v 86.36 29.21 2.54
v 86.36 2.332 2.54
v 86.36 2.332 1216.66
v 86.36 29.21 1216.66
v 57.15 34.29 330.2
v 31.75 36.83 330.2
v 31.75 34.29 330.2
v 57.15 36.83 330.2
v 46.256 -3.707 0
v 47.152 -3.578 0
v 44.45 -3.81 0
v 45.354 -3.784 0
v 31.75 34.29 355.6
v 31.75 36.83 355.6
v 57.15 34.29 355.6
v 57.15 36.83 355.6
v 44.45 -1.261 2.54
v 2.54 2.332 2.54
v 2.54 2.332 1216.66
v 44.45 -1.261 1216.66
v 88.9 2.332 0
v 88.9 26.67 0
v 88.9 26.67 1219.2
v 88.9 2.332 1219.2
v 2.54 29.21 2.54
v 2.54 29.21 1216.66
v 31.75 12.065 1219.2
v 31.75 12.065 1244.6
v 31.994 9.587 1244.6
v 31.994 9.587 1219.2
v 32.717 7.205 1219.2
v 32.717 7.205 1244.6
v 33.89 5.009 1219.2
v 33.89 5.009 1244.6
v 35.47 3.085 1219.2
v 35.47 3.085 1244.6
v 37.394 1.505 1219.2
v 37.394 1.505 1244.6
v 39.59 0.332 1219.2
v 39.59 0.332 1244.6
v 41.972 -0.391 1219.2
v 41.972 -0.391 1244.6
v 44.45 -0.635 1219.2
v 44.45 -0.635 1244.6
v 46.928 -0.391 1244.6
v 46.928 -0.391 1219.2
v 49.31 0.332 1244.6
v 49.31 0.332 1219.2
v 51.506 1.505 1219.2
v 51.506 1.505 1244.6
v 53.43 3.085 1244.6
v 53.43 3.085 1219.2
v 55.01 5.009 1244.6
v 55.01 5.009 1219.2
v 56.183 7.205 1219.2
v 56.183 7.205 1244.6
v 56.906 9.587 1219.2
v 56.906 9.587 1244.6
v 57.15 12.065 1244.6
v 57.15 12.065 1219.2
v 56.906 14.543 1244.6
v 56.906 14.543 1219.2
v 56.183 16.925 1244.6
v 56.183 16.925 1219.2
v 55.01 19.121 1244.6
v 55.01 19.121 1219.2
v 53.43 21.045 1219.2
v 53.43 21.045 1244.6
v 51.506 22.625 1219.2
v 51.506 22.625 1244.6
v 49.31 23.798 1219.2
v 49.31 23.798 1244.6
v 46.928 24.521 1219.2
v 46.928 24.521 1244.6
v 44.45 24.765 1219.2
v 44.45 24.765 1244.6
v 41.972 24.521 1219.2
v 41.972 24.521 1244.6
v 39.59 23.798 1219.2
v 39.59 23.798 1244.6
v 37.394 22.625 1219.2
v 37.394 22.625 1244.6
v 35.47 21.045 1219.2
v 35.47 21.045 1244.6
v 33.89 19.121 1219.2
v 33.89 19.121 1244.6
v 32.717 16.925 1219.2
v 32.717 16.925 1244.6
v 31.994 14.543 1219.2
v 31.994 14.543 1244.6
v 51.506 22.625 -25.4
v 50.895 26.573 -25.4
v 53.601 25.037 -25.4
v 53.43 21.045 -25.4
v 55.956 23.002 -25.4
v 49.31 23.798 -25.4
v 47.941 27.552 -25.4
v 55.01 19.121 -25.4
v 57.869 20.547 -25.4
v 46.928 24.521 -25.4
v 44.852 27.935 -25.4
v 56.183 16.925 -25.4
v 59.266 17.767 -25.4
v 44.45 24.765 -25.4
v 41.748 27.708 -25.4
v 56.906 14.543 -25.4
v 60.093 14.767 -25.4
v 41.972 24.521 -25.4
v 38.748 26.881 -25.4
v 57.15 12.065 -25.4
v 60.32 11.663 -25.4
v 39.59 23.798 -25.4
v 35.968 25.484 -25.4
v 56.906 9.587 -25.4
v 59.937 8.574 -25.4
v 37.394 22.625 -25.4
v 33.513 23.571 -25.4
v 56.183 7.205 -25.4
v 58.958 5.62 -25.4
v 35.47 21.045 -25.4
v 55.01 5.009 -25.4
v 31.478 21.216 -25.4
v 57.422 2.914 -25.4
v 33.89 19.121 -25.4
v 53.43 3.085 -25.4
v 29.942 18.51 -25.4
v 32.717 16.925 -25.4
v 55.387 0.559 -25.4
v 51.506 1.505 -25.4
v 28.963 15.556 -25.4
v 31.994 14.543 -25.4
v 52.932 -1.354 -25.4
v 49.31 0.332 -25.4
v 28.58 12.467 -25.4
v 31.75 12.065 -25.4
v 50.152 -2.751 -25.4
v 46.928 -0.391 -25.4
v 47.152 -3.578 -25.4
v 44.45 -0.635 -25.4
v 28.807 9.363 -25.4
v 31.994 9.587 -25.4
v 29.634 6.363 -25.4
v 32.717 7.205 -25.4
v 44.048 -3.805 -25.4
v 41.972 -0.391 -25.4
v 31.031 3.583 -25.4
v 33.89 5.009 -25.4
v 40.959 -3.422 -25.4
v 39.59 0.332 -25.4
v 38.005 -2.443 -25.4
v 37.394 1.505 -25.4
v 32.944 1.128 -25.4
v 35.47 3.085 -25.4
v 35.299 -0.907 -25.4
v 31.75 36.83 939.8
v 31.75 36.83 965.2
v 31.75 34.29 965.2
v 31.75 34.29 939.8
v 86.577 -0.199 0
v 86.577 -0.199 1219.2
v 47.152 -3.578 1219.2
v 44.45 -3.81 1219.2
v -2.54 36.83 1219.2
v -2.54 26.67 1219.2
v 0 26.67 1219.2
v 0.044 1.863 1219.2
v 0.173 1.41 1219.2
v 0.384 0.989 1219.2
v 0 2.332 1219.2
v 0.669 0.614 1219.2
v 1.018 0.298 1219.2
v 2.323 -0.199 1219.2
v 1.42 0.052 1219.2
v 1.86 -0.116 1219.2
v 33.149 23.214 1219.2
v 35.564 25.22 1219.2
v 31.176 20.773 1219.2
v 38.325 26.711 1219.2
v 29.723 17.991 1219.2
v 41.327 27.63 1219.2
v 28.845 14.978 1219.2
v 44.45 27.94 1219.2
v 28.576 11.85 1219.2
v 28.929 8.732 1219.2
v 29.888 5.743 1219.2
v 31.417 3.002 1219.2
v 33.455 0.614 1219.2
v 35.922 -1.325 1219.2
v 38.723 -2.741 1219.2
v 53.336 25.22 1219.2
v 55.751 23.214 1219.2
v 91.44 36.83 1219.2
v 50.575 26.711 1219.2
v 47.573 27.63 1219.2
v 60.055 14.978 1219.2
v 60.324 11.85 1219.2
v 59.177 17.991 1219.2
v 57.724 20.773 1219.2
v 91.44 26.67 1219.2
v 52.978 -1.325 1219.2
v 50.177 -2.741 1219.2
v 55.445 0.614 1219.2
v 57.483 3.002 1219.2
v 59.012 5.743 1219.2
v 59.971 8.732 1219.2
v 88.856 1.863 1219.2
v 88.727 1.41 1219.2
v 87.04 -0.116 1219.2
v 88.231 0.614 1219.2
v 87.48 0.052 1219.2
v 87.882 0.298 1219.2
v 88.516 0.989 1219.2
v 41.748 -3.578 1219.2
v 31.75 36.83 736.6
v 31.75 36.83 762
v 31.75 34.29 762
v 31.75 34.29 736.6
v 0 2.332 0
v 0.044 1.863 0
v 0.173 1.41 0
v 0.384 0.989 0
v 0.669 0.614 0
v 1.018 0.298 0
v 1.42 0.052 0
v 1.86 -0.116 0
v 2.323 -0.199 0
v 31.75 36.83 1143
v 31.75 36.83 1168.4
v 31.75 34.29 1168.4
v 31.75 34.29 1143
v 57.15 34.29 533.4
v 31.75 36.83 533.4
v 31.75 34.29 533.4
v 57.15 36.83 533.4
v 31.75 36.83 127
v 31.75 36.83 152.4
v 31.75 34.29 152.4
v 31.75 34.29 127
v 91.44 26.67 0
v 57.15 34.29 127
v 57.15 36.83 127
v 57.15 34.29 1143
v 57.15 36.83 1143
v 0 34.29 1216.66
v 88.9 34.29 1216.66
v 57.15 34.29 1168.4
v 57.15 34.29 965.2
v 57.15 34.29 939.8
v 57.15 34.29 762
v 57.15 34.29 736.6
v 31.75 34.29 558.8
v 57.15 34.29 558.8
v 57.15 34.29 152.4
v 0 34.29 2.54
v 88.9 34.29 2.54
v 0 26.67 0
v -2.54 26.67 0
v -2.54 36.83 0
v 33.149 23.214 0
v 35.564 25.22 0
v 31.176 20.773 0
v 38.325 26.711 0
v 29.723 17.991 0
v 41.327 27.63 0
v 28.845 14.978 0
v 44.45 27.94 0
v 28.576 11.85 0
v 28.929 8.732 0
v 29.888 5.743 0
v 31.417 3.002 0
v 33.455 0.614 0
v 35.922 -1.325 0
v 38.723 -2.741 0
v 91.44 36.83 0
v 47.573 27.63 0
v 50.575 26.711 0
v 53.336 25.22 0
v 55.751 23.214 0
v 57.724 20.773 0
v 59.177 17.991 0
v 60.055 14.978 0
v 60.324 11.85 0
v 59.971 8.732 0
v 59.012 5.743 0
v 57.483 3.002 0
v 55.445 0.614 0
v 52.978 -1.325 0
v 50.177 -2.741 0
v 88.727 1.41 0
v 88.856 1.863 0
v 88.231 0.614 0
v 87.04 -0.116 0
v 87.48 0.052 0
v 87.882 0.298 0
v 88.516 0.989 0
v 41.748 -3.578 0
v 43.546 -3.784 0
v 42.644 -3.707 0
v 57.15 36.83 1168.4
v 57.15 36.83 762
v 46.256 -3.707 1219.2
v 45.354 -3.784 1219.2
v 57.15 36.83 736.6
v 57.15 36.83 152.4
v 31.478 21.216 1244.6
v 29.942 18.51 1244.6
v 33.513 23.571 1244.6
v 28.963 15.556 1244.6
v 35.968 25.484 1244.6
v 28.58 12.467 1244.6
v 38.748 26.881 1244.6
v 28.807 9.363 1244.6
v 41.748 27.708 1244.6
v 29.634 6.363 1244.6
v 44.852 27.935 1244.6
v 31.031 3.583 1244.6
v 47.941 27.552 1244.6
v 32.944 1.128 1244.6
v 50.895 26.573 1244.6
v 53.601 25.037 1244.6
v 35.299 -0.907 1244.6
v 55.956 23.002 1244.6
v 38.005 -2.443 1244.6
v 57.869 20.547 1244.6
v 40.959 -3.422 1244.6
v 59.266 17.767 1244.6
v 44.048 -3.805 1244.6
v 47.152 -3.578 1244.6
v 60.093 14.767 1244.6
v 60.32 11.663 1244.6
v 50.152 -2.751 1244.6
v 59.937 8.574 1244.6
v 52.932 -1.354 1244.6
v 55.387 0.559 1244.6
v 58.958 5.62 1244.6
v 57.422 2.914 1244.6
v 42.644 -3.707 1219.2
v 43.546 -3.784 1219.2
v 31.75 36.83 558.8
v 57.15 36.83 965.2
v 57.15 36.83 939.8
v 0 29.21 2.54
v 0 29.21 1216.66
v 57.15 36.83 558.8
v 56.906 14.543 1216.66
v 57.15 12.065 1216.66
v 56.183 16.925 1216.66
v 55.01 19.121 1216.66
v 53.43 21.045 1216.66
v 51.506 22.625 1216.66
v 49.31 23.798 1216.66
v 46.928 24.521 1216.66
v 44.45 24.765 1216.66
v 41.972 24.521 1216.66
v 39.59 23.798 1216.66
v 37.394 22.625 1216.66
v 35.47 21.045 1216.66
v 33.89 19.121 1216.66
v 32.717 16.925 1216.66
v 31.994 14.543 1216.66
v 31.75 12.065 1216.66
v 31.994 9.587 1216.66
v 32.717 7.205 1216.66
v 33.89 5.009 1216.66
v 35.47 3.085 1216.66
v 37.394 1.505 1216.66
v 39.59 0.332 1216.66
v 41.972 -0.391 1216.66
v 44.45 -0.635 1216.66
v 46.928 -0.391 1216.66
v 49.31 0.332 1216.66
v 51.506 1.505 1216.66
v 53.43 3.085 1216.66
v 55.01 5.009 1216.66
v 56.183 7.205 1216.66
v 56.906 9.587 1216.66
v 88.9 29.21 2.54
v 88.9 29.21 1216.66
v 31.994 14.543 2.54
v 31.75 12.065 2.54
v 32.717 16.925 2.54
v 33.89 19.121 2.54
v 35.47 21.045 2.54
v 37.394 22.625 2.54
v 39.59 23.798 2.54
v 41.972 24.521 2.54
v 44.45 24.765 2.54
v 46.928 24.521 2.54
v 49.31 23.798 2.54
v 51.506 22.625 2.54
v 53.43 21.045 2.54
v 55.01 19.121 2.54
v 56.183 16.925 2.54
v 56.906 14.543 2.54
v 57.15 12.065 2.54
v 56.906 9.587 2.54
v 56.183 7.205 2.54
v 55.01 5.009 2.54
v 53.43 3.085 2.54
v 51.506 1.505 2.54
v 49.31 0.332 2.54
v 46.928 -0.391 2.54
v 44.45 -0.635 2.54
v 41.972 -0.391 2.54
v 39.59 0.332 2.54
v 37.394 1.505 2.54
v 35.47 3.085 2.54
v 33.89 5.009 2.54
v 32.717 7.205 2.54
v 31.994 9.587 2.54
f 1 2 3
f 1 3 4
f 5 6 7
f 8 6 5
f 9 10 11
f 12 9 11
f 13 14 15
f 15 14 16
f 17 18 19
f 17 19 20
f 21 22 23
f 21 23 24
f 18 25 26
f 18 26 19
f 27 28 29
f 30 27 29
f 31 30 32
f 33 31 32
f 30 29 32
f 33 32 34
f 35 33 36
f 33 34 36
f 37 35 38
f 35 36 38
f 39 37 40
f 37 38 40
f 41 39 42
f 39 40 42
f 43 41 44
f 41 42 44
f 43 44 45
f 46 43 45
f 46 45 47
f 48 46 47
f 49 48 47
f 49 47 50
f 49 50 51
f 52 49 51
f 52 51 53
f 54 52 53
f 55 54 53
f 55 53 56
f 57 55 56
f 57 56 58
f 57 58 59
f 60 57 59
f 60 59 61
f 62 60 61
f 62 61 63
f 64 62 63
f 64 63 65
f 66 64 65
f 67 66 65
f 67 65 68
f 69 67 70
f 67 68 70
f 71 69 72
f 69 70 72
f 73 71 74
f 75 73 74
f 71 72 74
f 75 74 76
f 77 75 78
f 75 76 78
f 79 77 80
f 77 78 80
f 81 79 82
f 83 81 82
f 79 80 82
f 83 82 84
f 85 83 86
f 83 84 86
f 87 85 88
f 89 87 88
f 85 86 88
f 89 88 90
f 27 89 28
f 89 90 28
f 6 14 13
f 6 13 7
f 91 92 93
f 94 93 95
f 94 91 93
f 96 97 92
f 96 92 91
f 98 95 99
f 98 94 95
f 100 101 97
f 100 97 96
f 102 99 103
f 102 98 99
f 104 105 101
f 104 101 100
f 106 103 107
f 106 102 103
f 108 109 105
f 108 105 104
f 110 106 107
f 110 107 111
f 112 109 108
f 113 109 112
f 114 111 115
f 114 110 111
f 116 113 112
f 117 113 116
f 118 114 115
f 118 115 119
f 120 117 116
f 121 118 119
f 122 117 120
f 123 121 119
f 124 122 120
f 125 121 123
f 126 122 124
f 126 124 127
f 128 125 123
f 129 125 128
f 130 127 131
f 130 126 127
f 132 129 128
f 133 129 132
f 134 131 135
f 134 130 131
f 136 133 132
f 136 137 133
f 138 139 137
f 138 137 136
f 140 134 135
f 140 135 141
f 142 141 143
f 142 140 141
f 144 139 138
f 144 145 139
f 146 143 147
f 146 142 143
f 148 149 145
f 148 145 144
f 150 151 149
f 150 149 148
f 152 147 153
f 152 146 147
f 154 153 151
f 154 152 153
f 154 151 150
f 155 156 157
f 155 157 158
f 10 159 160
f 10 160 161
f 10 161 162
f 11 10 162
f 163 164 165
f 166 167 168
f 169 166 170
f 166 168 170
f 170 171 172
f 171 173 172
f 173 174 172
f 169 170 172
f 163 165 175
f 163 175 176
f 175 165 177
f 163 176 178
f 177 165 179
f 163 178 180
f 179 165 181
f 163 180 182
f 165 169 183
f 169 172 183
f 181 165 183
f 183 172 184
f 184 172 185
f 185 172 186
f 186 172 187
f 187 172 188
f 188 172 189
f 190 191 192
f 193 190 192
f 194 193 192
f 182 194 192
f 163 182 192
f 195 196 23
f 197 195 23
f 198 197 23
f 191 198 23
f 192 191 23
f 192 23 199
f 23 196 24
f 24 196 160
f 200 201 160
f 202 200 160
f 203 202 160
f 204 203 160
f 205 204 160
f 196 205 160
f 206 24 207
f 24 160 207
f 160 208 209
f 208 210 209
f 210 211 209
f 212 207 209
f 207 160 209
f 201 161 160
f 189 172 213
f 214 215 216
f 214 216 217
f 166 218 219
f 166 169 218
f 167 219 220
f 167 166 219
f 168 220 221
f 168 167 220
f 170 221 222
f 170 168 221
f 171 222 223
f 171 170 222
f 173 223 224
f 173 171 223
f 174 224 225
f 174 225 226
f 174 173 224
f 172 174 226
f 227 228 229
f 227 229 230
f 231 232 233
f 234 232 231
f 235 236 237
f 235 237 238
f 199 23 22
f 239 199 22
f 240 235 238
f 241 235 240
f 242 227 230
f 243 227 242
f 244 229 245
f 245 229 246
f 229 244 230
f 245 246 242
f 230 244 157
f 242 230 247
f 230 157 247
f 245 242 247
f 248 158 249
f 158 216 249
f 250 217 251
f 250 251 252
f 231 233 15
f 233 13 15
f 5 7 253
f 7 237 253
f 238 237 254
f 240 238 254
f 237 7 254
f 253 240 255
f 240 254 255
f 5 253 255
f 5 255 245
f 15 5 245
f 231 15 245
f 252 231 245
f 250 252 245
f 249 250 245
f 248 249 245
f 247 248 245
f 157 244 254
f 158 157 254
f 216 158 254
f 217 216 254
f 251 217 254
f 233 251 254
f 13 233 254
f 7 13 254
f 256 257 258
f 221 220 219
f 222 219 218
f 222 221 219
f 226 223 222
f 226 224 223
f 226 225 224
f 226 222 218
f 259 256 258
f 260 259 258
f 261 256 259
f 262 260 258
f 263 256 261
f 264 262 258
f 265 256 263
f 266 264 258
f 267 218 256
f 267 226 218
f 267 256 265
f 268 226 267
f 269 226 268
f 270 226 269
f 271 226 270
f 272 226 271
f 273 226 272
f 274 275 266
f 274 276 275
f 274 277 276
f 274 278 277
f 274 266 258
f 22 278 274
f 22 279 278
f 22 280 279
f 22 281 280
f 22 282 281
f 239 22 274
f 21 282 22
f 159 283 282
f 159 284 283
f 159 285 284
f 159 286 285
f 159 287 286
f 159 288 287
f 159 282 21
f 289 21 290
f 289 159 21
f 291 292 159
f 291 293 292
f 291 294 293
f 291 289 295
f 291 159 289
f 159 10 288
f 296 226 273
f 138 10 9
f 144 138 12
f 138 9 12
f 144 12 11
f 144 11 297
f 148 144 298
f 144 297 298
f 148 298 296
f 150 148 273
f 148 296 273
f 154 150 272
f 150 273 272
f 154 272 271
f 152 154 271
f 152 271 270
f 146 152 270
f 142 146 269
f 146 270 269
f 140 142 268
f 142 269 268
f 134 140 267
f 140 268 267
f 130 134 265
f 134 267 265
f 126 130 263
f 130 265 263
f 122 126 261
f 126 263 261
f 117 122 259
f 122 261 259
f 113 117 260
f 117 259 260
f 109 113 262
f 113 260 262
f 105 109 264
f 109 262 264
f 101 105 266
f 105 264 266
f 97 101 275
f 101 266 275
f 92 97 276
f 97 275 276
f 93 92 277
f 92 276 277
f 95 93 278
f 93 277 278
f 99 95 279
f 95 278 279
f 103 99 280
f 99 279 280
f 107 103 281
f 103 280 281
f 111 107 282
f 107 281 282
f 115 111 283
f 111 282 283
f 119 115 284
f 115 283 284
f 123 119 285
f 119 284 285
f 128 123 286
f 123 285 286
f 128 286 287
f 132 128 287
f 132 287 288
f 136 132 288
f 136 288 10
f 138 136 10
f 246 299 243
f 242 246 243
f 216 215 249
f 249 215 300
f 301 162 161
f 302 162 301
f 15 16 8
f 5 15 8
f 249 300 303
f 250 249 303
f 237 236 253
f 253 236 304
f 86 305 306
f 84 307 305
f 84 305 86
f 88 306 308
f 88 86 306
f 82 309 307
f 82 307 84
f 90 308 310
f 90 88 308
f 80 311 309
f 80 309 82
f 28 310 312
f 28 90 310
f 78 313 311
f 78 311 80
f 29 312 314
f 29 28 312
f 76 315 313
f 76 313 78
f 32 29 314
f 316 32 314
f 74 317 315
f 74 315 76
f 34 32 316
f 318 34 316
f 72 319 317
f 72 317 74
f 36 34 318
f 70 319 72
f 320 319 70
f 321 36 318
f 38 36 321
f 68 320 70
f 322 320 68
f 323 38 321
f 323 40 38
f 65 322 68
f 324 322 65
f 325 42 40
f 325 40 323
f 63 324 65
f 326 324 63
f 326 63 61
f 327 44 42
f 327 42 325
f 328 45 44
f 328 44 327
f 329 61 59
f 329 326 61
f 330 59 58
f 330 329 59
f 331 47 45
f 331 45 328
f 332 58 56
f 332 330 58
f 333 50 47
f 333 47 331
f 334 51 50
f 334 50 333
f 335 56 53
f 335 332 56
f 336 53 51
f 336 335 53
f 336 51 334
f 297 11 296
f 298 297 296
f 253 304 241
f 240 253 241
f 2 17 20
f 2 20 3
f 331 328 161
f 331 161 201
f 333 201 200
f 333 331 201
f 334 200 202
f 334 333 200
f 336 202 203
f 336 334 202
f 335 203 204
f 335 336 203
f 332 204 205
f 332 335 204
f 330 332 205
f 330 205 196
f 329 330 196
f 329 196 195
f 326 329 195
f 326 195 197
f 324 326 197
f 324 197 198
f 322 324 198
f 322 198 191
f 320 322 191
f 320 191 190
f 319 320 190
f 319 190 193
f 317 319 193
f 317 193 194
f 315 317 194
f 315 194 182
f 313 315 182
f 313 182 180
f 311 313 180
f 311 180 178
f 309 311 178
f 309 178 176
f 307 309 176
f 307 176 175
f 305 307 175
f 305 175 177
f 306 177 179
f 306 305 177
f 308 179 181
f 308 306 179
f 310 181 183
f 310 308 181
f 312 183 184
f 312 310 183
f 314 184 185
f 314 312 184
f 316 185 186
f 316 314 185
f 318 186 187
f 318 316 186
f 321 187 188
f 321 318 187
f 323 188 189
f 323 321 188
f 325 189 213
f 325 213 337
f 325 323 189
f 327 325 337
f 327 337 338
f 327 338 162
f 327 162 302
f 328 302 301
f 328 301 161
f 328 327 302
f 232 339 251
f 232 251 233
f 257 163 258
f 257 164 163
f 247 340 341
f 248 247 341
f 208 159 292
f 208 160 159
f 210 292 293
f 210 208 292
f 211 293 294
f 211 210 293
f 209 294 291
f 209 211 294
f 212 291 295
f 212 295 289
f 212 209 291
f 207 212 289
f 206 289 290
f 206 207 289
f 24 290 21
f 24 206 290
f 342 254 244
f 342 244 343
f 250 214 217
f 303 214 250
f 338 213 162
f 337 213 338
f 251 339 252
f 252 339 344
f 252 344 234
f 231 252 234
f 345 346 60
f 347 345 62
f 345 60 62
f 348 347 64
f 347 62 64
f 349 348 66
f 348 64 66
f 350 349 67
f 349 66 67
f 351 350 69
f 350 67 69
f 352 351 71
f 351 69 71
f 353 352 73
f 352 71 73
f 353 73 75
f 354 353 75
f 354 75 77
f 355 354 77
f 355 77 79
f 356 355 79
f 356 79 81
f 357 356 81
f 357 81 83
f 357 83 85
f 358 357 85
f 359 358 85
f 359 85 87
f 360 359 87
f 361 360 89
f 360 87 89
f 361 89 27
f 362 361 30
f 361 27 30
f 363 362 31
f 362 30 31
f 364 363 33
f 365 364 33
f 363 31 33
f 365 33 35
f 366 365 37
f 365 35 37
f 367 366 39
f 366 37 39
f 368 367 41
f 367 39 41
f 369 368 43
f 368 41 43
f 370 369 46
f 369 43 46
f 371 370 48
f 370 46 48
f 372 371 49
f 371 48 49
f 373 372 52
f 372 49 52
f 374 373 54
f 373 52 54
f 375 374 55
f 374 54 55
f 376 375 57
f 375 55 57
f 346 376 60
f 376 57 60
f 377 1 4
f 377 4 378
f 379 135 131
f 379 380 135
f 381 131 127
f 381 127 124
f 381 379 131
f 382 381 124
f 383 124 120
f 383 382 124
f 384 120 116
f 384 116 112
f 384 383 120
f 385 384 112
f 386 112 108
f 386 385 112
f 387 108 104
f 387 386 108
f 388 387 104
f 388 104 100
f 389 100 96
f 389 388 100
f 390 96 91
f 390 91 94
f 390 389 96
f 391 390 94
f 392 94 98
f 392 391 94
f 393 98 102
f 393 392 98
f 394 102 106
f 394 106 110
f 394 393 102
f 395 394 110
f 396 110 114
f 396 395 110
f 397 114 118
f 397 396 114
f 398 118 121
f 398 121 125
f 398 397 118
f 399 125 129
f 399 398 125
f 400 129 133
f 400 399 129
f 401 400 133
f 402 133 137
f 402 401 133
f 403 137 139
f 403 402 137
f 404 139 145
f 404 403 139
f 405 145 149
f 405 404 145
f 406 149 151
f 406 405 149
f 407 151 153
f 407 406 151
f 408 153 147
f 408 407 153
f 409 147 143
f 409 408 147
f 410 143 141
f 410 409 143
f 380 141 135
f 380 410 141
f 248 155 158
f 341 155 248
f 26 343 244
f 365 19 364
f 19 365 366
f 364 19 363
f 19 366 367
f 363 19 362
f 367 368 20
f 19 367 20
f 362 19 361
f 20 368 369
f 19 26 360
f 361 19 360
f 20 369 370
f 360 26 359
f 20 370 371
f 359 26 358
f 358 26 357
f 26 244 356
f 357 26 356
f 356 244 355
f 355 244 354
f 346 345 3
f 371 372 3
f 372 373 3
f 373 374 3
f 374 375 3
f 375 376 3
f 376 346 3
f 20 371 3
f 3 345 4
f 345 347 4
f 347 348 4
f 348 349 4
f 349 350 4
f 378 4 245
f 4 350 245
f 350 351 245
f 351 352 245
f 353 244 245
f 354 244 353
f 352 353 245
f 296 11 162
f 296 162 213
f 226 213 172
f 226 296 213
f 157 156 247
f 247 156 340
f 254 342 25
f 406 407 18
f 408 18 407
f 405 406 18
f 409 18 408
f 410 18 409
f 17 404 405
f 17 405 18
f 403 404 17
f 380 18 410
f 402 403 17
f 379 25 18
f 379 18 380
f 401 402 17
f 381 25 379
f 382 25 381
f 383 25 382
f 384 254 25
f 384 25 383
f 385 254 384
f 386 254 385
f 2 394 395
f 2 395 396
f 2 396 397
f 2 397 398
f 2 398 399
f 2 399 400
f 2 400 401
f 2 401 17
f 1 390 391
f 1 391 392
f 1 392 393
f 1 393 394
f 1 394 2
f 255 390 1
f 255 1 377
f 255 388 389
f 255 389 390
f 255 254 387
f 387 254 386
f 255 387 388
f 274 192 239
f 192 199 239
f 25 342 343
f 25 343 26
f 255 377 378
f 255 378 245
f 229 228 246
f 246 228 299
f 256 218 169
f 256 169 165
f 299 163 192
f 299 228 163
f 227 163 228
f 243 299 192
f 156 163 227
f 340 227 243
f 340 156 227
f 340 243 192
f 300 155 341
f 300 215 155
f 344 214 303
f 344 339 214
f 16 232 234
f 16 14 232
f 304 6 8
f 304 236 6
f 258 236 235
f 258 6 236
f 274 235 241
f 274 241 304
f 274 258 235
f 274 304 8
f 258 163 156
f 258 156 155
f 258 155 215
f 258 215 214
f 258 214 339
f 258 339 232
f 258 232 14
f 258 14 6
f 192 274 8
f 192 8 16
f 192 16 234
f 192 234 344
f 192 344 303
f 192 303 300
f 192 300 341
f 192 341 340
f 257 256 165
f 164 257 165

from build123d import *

# Parameters (mm, degrees)
BOSS_EXTRUDE1_DEPTH    = 1219.2
SKETCH2_W              = 1219.2
SKETCH2_H              = 7.62
BOSS_EXTRUDE2_DEPTH    = 2.54
SKETCH3_W              = 1219.2
SKETCH3_H              = 7.62
BOSS_EXTRUDE3_DEPTH    = 2.54
SKETCH4_R              = 15.875
SKETCH4_R_2            = 12.7
BOSS_EXTRUDE4_DEPTH    = 25.4
BOSS_EXTRUDE5_START    = 25.4
SKETCH6_R              = 15.875
SKETCH6_R_2            = 12.7
BOSS_EXTRUDE5_DEPTH    = 25.4
SHELL2_START           = 2.54
SHELL2_DEPTH           = 1214.12
SKETCH9_W              = 93.98
SKETCH9_H              = 1219.2
BOSS_EXTRUDE7_DEPTH    = 2.54
FILLET1_R              = 2.54
CUT_EXTRUDE3_START     = -2.54
CUT_EXTRUDE3_OUTLINE_R = 12.7
CUT_EXTRUDE3_DEPTH     = 2.54
SKETCH11_R             = 12.7
CUT_EXTRUDE4_DEPTH     = 2.54
CUT_EXTRUDE5_REACH     = 1250.616
SKETCH12_W             = 25.4
SKETCH12_H             = 25.4
LPATTERN1_COUNT        = 6
LPATTERN1_PITCH        = 203.2


# Read off the part's stored shape, not the designer's step: Shell2, Cut-Extrude3
with BuildPart() as part:
    # Sketch1 → Boss-Extrude1 (new body)
    with BuildSketch(Plane.XY):
        Polygon((0, 0), (0, 34.29), (88.9, 34.29), (88.9, 0), (44.45, -3.81), align=None)
    extrude(amount=BOSS_EXTRUDE1_DEPTH)

    # Sketch2 → Boss-Extrude2 (add)
    with BuildSketch(Plane(origin=(88.9, 0, 0), x_dir=(0, 0, -1), z_dir=(1, 0, 0))):
        with Locations((-609.6, 30.48)):
            Rectangle(SKETCH2_W, SKETCH2_H)
    extrude(amount=BOSS_EXTRUDE2_DEPTH)

    # Sketch3 → Boss-Extrude3 (add)
    with BuildSketch(Plane.ZY):
        with Locations((609.6, 30.48)):
            Rectangle(SKETCH3_W, SKETCH3_H)
    extrude(amount=BOSS_EXTRUDE3_DEPTH)

    # Sketch4 → Boss-Extrude4 (add)
    with BuildSketch(Plane(origin=(0, 0, 0), x_dir=(-1, 0, 0), z_dir=(0, 0, -1))):
        with Locations(Location((-44.45, 12.065, 0), (0, 0, 260.201815092))):
            Circle(SKETCH4_R)
        with Locations((-44.45, 12.065)):
            Circle(SKETCH4_R_2, mode=Mode.SUBTRACT)
    extrude(amount=BOSS_EXTRUDE4_DEPTH)

    # Sketch6 → Boss-Extrude5 (add)
    with BuildSketch(Plane.XY.offset(1219.2).offset(BOSS_EXTRUDE5_START)):
        with Locations(Location((44.45, 12.065, 0), (0, 0, 279.798184908))):
            Circle(SKETCH6_R)
        with Locations(Location((44.45, 12.065, 0), (0, 0, 180))):
            Circle(SKETCH6_R_2, mode=Mode.SUBTRACT)
    extrude(amount=-BOSS_EXTRUDE5_DEPTH)

    # Shell2 outline → Shell2 (cut)
    with BuildSketch(Plane.XY.offset(SHELL2_START)):
        Polygon((44.45, -1.260686463), (86.36, 2.331599251), (86.36, 29.21), (88.9, 29.21), (88.9, 34.29), (0, 34.29), (0, 29.21), (2.54, 29.21), (2.54, 2.331599251), align=None)
    extrude(amount=SHELL2_DEPTH, mode=Mode.SUBTRACT)

    # Sketch9 → Boss-Extrude7 (add)
    with BuildSketch(Plane(origin=(0, 34.29, 0), x_dir=(1, 0, 0), z_dir=(0, 1, 0))):
        with Locations((44.45, -609.6)):
            Rectangle(SKETCH9_W, SKETCH9_H)
    extrude(amount=BOSS_EXTRUDE7_DEPTH)

    # Fillet1
    fillet1_edges = [part.edges().sort_by_distance(p)[0] for p in [
        (0, 0, 609.6),
        (88.9, 0, 609.6),
    ]]
    fillet(fillet1_edges, radius=FILLET1_R)

    # Cut-Extrude3 outline → Cut-Extrude3 (cut)
    with BuildSketch(Plane(origin=(0, 0, 0), x_dir=(-1, 0, 0), z_dir=(0, 0, -1)).offset(CUT_EXTRUDE3_START)):
        with Locations((-44.45, 12.065)):
            Circle(CUT_EXTRUDE3_OUTLINE_R)
    extrude(amount=CUT_EXTRUDE3_DEPTH, mode=Mode.SUBTRACT)

    # Sketch11 → Cut-Extrude4 (cut)
    with BuildSketch(Plane.XY.offset(1219.2)):
        with Locations((44.45, 12.065)):
            Circle(SKETCH11_R)
    extrude(amount=-CUT_EXTRUDE4_DEPTH, mode=Mode.SUBTRACT)

    # Sketch12 → Cut-Extrude5 (cut, up to next)
    with BuildSketch(Plane(origin=(0, 36.83, 0), x_dir=(1, 0, 0), z_dir=(0, 1, 0)), mode=Mode.PRIVATE) as cut_extrude5_sk1:
        with Locations((44.45, -1155.7)):
            Rectangle(SKETCH12_W, SKETCH12_H)
    cut_extrude5_tool1 = extrude(cut_extrude5_sk1.sketch, amount=-CUT_EXTRUDE5_REACH, mode=Mode.PRIVATE) & part.part
    cut_extrude5 = cut_extrude5_tool1.solids().sort_by_distance((44.45, 36.83, 1155.7))[0]
    add(cut_extrude5, mode=Mode.SUBTRACT)

    # LPattern1: Cut-Extrude5 ×6
    with Locations(*[(0, 0, -i * LPATTERN1_PITCH) for i in range(1, LPATTERN1_COUNT)]):
        add(cut_extrude5, mode=Mode.SUBTRACT)


solid = part.part
